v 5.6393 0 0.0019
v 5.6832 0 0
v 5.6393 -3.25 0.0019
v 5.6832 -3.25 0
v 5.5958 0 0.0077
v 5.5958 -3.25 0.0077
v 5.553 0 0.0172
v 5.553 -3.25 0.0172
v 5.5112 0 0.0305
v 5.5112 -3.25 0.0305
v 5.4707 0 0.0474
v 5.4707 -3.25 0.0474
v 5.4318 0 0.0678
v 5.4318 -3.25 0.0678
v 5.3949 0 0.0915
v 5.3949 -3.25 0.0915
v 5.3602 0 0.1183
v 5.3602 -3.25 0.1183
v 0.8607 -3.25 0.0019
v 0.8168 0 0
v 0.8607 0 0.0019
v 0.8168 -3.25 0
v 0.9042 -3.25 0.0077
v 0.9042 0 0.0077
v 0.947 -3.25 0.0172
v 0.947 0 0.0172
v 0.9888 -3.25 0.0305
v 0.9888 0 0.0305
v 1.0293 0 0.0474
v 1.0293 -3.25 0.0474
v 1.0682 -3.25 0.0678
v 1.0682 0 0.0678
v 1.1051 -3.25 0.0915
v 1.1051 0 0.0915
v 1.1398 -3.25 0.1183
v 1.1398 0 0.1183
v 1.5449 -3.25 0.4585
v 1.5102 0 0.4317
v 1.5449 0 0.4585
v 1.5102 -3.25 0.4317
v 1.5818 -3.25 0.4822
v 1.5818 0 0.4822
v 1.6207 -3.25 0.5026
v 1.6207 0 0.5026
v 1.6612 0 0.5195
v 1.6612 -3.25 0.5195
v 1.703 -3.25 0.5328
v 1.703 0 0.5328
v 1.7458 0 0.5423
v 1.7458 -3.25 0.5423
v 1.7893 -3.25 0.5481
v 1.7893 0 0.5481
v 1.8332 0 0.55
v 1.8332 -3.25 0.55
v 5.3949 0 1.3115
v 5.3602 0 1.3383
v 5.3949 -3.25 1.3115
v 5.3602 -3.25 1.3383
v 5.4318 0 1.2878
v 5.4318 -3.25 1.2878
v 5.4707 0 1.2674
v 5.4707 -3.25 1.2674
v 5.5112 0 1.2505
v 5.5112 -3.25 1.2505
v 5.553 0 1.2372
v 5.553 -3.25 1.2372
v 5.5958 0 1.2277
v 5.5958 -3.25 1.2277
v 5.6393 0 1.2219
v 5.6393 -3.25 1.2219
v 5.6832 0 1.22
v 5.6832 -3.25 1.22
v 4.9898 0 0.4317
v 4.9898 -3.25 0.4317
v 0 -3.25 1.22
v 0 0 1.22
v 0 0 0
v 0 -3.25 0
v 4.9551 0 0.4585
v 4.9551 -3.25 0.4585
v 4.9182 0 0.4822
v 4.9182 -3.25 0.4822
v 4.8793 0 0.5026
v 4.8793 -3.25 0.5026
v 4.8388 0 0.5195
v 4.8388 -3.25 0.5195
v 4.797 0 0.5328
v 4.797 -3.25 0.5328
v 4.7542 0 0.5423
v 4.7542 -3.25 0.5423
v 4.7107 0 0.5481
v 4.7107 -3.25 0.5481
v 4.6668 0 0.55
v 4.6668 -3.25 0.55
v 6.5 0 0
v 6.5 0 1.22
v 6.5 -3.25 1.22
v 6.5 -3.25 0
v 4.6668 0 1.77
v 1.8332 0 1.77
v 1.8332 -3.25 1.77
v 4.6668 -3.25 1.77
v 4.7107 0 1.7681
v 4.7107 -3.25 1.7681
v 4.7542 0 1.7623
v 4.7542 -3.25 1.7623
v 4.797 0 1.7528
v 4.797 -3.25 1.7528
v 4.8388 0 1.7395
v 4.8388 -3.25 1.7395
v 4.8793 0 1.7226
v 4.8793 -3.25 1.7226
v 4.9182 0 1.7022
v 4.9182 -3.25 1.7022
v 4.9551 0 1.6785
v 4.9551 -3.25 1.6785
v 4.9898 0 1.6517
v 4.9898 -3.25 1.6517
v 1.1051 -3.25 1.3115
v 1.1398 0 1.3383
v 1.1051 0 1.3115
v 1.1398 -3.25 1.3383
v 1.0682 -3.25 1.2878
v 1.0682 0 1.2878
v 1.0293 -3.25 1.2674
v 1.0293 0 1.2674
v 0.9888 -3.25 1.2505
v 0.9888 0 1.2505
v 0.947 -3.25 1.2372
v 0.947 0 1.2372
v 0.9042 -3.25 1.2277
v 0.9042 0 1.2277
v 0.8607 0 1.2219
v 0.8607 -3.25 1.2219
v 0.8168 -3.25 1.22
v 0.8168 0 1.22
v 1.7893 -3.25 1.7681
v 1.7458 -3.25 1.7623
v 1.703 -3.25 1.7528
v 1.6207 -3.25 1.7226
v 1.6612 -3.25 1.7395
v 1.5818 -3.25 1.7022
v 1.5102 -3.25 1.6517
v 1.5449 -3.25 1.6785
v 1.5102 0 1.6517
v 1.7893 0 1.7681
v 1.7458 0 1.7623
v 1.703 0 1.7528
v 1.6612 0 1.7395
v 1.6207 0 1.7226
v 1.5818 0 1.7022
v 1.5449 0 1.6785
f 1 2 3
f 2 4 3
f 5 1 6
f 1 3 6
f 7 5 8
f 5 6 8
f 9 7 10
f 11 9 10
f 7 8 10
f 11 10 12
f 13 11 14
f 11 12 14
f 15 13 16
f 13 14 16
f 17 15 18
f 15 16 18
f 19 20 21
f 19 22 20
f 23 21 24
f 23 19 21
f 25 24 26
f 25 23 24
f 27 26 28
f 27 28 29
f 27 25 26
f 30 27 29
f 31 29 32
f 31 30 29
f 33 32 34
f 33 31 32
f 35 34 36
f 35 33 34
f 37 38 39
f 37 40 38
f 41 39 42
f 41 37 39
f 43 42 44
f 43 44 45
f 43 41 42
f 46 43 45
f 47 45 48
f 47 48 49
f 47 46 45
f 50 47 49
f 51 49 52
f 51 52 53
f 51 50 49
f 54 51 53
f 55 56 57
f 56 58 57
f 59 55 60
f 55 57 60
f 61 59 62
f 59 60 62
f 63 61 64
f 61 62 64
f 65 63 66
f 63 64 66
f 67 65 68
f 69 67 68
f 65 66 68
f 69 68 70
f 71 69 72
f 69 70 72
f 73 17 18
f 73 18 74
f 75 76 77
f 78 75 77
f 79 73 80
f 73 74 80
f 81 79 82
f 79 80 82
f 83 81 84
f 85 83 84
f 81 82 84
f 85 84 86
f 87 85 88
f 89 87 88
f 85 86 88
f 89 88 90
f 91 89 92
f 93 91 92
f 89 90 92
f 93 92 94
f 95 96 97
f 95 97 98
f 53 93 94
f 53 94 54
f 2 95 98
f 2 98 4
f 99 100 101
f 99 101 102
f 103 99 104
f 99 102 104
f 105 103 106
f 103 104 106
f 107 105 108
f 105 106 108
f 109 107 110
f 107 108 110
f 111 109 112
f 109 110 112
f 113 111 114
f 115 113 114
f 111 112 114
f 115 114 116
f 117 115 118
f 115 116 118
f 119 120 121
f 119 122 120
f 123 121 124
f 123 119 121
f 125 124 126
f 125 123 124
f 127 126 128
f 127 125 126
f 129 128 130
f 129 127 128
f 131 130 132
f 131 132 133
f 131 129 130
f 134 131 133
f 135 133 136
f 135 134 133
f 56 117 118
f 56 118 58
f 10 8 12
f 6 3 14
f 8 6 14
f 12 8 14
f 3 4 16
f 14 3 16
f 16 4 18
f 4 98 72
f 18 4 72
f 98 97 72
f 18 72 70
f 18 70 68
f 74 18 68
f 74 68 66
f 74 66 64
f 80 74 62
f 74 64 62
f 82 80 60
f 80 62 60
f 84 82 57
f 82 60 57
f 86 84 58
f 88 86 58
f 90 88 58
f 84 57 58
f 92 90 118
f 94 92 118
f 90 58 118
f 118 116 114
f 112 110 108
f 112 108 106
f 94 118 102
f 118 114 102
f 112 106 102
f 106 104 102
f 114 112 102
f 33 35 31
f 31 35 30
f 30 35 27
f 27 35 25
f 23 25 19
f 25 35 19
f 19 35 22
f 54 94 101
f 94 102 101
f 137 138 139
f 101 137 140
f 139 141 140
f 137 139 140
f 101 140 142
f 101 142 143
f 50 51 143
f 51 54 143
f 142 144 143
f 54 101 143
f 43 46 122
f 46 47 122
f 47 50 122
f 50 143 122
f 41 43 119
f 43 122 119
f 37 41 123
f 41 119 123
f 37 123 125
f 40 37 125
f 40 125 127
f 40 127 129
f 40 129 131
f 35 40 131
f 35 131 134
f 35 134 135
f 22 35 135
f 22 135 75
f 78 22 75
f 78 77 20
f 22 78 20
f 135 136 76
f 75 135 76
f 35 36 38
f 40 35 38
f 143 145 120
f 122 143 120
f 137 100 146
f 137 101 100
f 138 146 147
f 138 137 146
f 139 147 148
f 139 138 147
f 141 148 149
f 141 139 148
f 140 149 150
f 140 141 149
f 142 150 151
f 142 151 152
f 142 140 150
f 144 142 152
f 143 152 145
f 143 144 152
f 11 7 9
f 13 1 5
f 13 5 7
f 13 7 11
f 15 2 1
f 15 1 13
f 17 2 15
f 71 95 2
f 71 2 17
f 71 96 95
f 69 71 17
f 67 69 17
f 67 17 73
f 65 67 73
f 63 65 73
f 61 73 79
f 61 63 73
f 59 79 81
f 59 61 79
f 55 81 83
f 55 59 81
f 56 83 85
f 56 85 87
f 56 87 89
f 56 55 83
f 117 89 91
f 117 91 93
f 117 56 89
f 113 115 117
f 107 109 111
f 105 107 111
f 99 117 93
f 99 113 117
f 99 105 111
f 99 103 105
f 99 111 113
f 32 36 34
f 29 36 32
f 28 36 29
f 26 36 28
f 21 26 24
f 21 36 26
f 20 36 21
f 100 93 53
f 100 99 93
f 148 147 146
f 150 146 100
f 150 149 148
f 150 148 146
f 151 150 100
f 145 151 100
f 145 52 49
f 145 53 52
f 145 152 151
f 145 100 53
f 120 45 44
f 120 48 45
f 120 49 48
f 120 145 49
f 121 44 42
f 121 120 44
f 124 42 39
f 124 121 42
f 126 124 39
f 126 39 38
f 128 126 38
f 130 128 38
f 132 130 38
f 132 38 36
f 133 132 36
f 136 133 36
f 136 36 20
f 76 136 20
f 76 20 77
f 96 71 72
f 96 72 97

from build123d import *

# Parameters (mm, degrees)
F1_DEPTH = 3.25
F2_R     = 0.5


with BuildPart() as f1:
    # F0 (on Front) → F1 (new body)
    with BuildSketch(Plane.XZ):
        Polygon((0, 1.22), (0, 0), (1, 0), (1.65, 0.55), (3.25, 0.55), (3.25, 1.77), (1.65, 1.77), (1, 1.22), align=None)
    extrude(amount=F1_DEPTH)

    # F2
    f2_edges = [f1.edges().sort_by_distance(p)[0] for p in [
        (1, -1.625, 0),
        (1.65, -1.625, 0.55),
        (1, -1.625, 1.22),
        (1.65, -1.625, 1.77),
    ]]
    fillet(f2_edges, radius=F2_R)

    # F3: F1 across face


with BuildPart() as f1_1:
    add(f1.part)
    add(f1.part.mirror(Plane(origin=(3.25, -1.625, 1.16), x_dir=(0, 1, 0), z_dir=(1, 0, 0))))


solid = f1_1.part
